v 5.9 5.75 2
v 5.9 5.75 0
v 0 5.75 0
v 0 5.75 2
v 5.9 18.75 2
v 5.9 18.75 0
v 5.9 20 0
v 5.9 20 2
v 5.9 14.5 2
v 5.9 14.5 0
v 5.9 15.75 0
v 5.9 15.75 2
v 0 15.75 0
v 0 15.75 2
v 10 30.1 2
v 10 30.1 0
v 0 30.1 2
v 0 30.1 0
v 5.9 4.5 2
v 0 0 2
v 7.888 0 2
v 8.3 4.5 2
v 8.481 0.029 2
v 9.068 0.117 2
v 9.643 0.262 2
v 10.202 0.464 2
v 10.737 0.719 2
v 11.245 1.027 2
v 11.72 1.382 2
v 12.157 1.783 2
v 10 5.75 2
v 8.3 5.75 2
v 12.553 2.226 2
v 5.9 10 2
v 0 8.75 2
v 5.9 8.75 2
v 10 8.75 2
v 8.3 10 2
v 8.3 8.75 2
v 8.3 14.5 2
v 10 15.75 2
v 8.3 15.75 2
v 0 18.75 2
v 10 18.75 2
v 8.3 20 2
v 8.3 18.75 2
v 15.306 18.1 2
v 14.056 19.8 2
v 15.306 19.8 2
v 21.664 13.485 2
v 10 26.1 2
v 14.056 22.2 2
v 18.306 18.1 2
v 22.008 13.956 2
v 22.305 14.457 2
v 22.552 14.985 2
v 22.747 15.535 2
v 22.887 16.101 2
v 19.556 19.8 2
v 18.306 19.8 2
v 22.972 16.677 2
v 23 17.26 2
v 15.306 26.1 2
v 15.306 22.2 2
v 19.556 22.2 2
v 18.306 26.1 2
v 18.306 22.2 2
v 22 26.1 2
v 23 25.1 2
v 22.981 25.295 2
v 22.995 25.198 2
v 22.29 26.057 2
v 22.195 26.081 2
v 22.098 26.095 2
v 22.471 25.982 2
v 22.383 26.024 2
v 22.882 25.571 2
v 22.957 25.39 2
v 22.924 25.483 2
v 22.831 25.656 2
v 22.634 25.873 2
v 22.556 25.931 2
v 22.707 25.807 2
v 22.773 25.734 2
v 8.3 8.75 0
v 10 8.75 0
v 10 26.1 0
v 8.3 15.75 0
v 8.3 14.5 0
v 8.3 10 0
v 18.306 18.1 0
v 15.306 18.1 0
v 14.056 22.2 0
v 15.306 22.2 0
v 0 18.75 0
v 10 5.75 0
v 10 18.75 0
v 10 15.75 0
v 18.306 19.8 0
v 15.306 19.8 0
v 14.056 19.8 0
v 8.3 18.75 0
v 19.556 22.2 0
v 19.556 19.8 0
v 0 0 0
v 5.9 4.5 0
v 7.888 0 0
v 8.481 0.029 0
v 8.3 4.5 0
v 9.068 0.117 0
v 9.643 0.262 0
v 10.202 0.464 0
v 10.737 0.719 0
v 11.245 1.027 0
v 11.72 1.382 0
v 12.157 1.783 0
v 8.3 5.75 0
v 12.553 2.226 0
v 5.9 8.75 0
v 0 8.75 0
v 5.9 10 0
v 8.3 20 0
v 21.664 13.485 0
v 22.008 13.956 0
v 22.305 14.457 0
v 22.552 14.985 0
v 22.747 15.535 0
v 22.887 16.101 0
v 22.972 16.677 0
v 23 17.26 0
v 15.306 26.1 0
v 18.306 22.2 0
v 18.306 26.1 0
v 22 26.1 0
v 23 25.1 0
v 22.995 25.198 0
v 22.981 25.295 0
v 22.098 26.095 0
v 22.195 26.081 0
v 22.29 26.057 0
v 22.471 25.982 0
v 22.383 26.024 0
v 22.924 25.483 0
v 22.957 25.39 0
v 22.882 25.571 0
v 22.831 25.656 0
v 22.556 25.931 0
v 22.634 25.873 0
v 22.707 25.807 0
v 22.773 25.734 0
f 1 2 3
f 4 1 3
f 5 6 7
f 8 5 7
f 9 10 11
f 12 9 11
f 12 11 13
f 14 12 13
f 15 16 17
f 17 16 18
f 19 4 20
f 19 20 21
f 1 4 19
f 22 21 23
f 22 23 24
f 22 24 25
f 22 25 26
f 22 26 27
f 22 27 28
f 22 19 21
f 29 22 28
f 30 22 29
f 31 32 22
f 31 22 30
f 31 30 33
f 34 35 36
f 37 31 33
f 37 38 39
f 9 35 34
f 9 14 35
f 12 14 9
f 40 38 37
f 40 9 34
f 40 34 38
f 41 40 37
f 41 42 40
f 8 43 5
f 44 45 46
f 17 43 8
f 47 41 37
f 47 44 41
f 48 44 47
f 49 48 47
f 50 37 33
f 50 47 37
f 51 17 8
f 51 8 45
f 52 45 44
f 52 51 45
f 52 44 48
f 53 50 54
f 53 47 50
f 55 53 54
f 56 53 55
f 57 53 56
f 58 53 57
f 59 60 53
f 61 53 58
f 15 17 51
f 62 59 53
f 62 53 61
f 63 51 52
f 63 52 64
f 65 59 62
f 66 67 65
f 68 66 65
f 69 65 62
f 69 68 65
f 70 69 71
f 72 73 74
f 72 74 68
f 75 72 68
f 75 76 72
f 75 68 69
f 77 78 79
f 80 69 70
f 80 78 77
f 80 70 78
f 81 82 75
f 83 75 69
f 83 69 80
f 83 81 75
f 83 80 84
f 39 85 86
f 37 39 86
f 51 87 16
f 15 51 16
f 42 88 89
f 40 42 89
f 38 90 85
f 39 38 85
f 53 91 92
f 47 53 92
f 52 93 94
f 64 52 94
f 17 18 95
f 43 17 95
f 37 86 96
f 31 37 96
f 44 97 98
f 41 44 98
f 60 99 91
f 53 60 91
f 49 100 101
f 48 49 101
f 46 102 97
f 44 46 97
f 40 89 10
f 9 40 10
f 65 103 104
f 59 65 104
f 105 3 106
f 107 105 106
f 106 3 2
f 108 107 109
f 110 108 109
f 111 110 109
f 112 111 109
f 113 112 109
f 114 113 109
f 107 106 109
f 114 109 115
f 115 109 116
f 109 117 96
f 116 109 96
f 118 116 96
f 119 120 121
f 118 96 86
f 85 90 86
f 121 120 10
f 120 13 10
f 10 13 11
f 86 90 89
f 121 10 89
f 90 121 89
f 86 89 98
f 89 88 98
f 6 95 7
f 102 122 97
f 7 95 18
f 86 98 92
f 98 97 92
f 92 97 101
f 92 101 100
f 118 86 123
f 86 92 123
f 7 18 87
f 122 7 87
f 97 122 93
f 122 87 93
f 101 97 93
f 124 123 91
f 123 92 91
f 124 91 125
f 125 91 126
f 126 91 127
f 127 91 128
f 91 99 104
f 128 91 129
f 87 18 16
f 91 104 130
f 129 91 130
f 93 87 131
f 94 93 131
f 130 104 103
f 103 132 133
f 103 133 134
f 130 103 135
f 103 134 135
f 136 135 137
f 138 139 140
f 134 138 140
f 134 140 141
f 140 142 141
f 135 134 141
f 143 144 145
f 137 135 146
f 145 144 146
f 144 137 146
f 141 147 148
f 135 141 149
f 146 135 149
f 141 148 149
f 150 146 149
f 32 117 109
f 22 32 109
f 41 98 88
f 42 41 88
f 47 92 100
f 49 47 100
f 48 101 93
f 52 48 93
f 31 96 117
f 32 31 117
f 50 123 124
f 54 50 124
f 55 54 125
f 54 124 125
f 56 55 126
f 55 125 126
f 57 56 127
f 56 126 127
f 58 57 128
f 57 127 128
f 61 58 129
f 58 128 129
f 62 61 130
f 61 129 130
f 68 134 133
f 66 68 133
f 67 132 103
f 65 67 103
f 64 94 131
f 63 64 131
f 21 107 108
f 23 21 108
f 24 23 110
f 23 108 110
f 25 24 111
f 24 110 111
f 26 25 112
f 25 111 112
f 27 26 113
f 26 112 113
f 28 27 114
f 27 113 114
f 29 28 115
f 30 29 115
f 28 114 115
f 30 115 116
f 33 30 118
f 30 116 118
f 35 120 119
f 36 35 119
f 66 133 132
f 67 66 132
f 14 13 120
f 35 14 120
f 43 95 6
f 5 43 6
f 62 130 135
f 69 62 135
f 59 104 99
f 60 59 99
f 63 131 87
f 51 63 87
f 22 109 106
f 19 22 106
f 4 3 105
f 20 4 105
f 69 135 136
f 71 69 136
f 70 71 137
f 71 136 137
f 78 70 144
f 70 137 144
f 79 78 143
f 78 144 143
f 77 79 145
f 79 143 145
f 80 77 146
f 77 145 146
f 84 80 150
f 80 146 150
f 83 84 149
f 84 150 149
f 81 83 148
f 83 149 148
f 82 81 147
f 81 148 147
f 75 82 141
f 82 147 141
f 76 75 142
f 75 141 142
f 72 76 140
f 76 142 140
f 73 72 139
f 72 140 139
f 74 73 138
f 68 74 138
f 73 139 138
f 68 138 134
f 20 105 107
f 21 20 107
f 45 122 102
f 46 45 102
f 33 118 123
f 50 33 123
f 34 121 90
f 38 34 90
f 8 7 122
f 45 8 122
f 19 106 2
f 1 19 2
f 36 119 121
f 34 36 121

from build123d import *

# Parameters (mm, degrees)
BOSS_EXTRUDE1_DEPTH = 2


with BuildPart() as part:
    # Model → Boss-Extrude1 (new body)
    with BuildSketch(Plane.XY):
        with BuildLine():
            Line((10, 5.75), (8.3, 5.75))
            Line((8.3, 5.75), (8.3, 4.5))
            Line((8.3, 4.5), (5.9, 4.5))
            Line((5.9, 4.5), (5.9, 5.75))
            Line((5.9, 5.75), (0, 5.75))
            Line((0, 5.75), (0, 0))
            Line((0, 0), (7.88848997, 0))
            ThreePointArc((7.88848997, 0), (10.472480827, 0.584929248), (12.552654408, 2.225669584))
            Line((12.552654408, 2.225669584), (21.664164438, 13.485304109))
            ThreePointArc((21.664164438, 13.485304109), (22.656190707, 15.257758734), (23, 17.259634525))
            Line((23, 17.259634525), (23, 25.1))
            ThreePointArc((23, 25.1), (22.707106781, 25.807106781), (22, 26.1))
            Line((22, 26.1), (18.306018336, 26.1))
            Line((18.306018336, 26.1), (18.306018336, 22.2))
            Line((18.306018336, 22.2), (19.556018336, 22.2))
            Line((19.556018336, 22.2), (19.556018336, 19.8))
            Line((19.556018336, 19.8), (18.306018336, 19.8))
            Line((18.306018336, 19.8), (18.306018336, 18.1))
            Line((18.306018336, 18.1), (15.306018336, 18.1))
            Line((15.306018336, 18.1), (15.306018336, 19.8))
            Line((15.306018336, 19.8), (14.056018336, 19.8))
            Line((14.056018336, 19.8), (14.056018336, 22.2))
            Line((14.056018336, 22.2), (15.306018336, 22.2))
            Line((15.306018336, 22.2), (15.306018336, 26.1))
            Line((15.306018336, 26.1), (10, 26.1))
            Line((10, 26.1), (10, 30.1))
            Line((10, 30.1), (0, 30.1))
            Line((0, 30.1), (0, 18.75))
            Line((0, 18.75), (5.9, 18.75))
            Line((5.9, 18.75), (5.9, 20))
            Line((5.9, 20), (8.3, 20))
            Line((8.3, 20), (8.3, 18.75))
            Line((8.3, 18.75), (10, 18.75))
            Line((10, 18.75), (10, 15.75))
            Line((10, 15.75), (8.3, 15.75))
            Line((8.3, 15.75), (8.3, 14.5))
            Line((8.3, 14.5), (5.9, 14.5))
            Line((5.9, 14.5), (5.9, 15.75))
            Line((5.9, 15.75), (0, 15.75))
            Line((0, 15.75), (0, 8.75))
            Line((0, 8.75), (5.9, 8.75))
            Line((5.9, 8.75), (5.9, 10))
            Line((5.9, 10), (8.3, 10))
            Line((8.3, 10), (8.3, 8.75))
            Line((8.3, 8.75), (10, 8.75))
            Line((10, 8.75), (10, 5.75))
        make_face()
    extrude(amount=BOSS_EXTRUDE1_DEPTH)


solid = part.part
